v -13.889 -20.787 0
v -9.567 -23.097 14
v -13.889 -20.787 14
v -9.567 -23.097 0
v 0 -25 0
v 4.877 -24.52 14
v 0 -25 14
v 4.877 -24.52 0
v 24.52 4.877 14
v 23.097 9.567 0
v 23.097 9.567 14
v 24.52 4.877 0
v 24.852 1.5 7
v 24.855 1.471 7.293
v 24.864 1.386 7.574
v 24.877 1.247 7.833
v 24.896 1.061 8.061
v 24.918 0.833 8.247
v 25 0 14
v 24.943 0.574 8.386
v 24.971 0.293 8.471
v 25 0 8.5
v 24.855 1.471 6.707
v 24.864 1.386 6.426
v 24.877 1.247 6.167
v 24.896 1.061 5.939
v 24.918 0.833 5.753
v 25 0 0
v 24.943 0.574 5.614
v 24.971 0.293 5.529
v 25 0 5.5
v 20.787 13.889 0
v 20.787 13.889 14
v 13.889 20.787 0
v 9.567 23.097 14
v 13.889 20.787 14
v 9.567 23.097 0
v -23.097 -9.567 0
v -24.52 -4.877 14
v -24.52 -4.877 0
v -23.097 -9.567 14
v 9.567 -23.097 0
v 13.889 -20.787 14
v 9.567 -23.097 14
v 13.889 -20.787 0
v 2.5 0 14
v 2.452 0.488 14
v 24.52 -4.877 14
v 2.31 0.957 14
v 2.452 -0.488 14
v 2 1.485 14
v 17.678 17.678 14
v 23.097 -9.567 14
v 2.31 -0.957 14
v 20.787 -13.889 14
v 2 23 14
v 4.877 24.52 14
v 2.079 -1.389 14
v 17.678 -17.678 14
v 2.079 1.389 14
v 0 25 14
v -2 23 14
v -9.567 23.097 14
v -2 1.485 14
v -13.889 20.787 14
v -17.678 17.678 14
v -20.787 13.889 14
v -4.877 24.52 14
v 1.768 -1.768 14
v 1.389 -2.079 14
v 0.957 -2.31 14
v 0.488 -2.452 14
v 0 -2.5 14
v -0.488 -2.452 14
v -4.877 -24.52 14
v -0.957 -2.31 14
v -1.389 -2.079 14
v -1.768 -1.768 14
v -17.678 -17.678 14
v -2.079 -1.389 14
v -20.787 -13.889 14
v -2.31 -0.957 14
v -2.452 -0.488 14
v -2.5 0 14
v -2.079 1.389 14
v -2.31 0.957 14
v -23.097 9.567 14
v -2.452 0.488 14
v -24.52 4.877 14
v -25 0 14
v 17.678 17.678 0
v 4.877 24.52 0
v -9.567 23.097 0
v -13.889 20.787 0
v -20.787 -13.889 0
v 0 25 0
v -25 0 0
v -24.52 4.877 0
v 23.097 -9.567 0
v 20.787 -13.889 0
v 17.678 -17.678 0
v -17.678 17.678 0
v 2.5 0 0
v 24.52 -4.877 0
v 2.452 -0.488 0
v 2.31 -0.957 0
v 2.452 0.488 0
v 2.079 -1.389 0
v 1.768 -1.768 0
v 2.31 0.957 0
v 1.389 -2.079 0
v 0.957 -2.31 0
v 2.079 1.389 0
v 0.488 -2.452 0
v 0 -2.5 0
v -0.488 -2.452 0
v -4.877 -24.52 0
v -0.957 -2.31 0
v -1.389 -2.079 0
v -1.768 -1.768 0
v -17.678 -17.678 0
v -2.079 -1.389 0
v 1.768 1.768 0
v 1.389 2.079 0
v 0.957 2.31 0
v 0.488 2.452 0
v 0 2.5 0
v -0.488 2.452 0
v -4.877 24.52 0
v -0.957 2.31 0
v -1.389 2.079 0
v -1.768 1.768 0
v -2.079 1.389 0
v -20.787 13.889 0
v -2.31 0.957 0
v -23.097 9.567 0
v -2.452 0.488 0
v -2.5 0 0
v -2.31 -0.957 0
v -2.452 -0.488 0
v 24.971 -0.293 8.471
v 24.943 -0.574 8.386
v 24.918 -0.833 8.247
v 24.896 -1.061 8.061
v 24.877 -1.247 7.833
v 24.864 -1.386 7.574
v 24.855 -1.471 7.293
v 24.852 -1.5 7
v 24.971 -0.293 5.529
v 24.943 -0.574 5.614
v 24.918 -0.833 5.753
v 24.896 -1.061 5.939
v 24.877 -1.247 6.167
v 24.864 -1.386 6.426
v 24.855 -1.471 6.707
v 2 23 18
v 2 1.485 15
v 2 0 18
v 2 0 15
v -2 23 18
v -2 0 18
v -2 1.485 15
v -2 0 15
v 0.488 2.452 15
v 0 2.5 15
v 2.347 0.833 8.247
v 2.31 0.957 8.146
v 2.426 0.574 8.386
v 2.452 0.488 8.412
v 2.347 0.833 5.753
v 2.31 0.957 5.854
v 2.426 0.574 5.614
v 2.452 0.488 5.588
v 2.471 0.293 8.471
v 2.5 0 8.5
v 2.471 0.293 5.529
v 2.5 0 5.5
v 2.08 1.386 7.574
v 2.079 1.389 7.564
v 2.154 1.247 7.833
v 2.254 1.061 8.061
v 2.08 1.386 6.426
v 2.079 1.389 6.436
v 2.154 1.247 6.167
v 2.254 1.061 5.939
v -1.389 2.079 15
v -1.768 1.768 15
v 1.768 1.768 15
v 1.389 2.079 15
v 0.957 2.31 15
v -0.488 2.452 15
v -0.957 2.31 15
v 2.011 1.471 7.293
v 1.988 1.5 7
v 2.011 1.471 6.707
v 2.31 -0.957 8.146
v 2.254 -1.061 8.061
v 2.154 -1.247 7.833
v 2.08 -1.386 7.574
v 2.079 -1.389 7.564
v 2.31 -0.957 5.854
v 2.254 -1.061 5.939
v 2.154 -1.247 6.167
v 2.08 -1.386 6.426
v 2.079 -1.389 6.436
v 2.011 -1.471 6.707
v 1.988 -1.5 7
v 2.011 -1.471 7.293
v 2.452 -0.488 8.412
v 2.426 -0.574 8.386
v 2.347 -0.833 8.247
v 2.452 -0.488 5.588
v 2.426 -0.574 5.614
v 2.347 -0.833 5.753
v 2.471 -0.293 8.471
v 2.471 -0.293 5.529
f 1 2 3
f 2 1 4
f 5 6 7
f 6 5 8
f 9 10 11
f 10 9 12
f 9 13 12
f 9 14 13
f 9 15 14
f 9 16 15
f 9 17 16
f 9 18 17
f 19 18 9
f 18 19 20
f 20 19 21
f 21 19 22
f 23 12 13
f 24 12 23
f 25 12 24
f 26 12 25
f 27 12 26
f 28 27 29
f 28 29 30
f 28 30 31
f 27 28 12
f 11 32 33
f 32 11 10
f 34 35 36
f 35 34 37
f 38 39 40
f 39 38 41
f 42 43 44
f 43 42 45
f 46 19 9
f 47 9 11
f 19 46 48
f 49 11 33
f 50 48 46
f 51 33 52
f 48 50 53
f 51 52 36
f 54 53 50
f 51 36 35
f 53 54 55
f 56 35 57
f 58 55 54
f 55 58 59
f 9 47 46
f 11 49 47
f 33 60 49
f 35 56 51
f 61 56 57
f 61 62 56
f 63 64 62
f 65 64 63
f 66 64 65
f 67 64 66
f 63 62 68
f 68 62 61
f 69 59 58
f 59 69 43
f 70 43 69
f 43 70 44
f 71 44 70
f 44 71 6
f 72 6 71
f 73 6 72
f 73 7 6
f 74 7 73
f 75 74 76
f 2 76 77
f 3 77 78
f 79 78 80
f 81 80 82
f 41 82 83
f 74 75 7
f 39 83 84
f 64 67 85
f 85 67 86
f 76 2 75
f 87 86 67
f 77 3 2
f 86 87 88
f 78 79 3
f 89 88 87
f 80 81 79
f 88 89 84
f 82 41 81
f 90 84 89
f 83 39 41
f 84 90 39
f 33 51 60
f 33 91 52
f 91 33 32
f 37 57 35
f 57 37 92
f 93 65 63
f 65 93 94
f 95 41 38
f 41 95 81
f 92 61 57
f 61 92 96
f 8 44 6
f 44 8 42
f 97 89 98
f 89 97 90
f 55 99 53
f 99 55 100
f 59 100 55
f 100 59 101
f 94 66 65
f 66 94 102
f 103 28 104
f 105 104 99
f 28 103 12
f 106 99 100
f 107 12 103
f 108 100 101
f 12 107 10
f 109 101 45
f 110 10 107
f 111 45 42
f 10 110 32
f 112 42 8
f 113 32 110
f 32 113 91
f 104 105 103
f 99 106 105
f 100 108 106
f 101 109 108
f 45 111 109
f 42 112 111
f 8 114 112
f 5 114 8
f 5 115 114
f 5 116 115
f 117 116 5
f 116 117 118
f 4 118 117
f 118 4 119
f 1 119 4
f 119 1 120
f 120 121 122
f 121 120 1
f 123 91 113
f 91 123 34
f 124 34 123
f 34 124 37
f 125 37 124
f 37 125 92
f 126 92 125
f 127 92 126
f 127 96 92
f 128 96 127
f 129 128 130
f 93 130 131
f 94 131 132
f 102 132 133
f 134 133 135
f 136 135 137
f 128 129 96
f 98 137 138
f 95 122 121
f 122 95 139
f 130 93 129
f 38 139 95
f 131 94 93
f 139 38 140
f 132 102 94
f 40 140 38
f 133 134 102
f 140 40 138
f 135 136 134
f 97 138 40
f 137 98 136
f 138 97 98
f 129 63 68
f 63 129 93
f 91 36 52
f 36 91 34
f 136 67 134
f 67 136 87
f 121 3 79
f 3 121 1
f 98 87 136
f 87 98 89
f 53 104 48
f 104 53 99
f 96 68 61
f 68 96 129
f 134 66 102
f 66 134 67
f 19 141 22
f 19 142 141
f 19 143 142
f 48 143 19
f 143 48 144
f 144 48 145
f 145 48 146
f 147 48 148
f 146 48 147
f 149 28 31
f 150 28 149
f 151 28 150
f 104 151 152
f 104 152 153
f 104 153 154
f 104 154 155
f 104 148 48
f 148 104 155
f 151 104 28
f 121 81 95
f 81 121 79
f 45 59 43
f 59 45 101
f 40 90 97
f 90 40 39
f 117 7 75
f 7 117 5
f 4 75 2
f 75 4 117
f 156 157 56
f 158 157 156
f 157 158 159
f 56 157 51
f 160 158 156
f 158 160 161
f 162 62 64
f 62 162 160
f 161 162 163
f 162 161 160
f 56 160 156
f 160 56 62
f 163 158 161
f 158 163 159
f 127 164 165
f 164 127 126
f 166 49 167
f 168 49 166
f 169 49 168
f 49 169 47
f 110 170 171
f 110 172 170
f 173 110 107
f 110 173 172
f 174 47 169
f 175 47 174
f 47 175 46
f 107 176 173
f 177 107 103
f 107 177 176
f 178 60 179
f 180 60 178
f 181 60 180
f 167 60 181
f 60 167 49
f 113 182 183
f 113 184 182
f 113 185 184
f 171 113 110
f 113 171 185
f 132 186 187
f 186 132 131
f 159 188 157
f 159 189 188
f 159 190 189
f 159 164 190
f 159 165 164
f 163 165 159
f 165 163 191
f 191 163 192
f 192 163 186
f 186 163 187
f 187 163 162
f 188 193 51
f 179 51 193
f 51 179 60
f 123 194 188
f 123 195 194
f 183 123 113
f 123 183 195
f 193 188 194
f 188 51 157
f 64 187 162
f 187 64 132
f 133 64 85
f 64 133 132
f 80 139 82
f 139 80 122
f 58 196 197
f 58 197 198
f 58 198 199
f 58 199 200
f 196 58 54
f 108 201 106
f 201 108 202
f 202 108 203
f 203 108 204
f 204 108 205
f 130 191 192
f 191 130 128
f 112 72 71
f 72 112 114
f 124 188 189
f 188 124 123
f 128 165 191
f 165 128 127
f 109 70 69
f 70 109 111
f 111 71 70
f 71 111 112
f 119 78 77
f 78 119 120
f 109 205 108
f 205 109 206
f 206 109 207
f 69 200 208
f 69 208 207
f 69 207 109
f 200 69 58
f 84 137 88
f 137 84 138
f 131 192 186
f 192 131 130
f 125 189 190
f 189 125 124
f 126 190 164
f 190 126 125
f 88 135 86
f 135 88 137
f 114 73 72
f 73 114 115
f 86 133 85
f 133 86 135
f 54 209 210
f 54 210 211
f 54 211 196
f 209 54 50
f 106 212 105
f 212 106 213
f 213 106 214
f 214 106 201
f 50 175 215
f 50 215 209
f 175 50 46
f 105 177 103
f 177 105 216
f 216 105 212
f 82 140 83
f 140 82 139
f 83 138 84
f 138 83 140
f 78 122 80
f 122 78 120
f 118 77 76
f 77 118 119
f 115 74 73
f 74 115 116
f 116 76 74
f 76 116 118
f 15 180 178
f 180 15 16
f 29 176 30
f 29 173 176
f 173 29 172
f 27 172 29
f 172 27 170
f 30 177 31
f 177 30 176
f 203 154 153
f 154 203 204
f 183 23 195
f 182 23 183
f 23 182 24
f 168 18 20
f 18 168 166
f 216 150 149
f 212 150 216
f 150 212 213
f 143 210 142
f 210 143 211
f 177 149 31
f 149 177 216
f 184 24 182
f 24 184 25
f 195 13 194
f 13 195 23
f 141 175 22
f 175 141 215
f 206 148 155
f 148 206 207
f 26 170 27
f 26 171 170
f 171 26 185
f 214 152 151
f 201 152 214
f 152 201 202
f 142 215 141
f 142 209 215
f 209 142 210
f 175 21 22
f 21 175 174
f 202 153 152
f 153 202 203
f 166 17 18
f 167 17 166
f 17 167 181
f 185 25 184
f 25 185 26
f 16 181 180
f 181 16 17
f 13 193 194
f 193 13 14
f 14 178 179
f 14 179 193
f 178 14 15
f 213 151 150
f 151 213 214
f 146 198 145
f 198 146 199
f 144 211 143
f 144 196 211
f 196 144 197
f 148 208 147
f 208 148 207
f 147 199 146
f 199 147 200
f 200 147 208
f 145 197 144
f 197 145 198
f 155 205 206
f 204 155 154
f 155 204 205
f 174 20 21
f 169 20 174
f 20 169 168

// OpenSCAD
$fn = 32;

// ----------------------------------------------------------------------
// Control knob: pointer knob
// ----------------------------------------------------------------------

// --- parameters (mm) ---
rib_w = 4;                // pointer rib width
rib_h = 5;                // pointer rib height
knob_d = 50;              // knob body diameter
knob_h = 14;              // knob body height
bore_d = 5;               // shaft bore diameter
set_d = 3;                // set screw bore diameter

rib_poke = rib_h - 1;  // rib height above the top
total_h = knob_h + rib_h - 1;  // overall height

difference() {
  union() {
    cylinder(h = knob_h, d = knob_d);
    translate([-rib_w / 2, 0, knob_h - 1])
      cube([rib_w, knob_d / 2 - 2, rib_h]);
  }
  translate([0, 0, -1]) cylinder(h = knob_h + 2, d = bore_d);
  translate([-1, 0, knob_h / 2]) rotate([0, 90, 0])
    cylinder(h = knob_d / 2 + bore_d / 2 + 2, d = set_d);}
